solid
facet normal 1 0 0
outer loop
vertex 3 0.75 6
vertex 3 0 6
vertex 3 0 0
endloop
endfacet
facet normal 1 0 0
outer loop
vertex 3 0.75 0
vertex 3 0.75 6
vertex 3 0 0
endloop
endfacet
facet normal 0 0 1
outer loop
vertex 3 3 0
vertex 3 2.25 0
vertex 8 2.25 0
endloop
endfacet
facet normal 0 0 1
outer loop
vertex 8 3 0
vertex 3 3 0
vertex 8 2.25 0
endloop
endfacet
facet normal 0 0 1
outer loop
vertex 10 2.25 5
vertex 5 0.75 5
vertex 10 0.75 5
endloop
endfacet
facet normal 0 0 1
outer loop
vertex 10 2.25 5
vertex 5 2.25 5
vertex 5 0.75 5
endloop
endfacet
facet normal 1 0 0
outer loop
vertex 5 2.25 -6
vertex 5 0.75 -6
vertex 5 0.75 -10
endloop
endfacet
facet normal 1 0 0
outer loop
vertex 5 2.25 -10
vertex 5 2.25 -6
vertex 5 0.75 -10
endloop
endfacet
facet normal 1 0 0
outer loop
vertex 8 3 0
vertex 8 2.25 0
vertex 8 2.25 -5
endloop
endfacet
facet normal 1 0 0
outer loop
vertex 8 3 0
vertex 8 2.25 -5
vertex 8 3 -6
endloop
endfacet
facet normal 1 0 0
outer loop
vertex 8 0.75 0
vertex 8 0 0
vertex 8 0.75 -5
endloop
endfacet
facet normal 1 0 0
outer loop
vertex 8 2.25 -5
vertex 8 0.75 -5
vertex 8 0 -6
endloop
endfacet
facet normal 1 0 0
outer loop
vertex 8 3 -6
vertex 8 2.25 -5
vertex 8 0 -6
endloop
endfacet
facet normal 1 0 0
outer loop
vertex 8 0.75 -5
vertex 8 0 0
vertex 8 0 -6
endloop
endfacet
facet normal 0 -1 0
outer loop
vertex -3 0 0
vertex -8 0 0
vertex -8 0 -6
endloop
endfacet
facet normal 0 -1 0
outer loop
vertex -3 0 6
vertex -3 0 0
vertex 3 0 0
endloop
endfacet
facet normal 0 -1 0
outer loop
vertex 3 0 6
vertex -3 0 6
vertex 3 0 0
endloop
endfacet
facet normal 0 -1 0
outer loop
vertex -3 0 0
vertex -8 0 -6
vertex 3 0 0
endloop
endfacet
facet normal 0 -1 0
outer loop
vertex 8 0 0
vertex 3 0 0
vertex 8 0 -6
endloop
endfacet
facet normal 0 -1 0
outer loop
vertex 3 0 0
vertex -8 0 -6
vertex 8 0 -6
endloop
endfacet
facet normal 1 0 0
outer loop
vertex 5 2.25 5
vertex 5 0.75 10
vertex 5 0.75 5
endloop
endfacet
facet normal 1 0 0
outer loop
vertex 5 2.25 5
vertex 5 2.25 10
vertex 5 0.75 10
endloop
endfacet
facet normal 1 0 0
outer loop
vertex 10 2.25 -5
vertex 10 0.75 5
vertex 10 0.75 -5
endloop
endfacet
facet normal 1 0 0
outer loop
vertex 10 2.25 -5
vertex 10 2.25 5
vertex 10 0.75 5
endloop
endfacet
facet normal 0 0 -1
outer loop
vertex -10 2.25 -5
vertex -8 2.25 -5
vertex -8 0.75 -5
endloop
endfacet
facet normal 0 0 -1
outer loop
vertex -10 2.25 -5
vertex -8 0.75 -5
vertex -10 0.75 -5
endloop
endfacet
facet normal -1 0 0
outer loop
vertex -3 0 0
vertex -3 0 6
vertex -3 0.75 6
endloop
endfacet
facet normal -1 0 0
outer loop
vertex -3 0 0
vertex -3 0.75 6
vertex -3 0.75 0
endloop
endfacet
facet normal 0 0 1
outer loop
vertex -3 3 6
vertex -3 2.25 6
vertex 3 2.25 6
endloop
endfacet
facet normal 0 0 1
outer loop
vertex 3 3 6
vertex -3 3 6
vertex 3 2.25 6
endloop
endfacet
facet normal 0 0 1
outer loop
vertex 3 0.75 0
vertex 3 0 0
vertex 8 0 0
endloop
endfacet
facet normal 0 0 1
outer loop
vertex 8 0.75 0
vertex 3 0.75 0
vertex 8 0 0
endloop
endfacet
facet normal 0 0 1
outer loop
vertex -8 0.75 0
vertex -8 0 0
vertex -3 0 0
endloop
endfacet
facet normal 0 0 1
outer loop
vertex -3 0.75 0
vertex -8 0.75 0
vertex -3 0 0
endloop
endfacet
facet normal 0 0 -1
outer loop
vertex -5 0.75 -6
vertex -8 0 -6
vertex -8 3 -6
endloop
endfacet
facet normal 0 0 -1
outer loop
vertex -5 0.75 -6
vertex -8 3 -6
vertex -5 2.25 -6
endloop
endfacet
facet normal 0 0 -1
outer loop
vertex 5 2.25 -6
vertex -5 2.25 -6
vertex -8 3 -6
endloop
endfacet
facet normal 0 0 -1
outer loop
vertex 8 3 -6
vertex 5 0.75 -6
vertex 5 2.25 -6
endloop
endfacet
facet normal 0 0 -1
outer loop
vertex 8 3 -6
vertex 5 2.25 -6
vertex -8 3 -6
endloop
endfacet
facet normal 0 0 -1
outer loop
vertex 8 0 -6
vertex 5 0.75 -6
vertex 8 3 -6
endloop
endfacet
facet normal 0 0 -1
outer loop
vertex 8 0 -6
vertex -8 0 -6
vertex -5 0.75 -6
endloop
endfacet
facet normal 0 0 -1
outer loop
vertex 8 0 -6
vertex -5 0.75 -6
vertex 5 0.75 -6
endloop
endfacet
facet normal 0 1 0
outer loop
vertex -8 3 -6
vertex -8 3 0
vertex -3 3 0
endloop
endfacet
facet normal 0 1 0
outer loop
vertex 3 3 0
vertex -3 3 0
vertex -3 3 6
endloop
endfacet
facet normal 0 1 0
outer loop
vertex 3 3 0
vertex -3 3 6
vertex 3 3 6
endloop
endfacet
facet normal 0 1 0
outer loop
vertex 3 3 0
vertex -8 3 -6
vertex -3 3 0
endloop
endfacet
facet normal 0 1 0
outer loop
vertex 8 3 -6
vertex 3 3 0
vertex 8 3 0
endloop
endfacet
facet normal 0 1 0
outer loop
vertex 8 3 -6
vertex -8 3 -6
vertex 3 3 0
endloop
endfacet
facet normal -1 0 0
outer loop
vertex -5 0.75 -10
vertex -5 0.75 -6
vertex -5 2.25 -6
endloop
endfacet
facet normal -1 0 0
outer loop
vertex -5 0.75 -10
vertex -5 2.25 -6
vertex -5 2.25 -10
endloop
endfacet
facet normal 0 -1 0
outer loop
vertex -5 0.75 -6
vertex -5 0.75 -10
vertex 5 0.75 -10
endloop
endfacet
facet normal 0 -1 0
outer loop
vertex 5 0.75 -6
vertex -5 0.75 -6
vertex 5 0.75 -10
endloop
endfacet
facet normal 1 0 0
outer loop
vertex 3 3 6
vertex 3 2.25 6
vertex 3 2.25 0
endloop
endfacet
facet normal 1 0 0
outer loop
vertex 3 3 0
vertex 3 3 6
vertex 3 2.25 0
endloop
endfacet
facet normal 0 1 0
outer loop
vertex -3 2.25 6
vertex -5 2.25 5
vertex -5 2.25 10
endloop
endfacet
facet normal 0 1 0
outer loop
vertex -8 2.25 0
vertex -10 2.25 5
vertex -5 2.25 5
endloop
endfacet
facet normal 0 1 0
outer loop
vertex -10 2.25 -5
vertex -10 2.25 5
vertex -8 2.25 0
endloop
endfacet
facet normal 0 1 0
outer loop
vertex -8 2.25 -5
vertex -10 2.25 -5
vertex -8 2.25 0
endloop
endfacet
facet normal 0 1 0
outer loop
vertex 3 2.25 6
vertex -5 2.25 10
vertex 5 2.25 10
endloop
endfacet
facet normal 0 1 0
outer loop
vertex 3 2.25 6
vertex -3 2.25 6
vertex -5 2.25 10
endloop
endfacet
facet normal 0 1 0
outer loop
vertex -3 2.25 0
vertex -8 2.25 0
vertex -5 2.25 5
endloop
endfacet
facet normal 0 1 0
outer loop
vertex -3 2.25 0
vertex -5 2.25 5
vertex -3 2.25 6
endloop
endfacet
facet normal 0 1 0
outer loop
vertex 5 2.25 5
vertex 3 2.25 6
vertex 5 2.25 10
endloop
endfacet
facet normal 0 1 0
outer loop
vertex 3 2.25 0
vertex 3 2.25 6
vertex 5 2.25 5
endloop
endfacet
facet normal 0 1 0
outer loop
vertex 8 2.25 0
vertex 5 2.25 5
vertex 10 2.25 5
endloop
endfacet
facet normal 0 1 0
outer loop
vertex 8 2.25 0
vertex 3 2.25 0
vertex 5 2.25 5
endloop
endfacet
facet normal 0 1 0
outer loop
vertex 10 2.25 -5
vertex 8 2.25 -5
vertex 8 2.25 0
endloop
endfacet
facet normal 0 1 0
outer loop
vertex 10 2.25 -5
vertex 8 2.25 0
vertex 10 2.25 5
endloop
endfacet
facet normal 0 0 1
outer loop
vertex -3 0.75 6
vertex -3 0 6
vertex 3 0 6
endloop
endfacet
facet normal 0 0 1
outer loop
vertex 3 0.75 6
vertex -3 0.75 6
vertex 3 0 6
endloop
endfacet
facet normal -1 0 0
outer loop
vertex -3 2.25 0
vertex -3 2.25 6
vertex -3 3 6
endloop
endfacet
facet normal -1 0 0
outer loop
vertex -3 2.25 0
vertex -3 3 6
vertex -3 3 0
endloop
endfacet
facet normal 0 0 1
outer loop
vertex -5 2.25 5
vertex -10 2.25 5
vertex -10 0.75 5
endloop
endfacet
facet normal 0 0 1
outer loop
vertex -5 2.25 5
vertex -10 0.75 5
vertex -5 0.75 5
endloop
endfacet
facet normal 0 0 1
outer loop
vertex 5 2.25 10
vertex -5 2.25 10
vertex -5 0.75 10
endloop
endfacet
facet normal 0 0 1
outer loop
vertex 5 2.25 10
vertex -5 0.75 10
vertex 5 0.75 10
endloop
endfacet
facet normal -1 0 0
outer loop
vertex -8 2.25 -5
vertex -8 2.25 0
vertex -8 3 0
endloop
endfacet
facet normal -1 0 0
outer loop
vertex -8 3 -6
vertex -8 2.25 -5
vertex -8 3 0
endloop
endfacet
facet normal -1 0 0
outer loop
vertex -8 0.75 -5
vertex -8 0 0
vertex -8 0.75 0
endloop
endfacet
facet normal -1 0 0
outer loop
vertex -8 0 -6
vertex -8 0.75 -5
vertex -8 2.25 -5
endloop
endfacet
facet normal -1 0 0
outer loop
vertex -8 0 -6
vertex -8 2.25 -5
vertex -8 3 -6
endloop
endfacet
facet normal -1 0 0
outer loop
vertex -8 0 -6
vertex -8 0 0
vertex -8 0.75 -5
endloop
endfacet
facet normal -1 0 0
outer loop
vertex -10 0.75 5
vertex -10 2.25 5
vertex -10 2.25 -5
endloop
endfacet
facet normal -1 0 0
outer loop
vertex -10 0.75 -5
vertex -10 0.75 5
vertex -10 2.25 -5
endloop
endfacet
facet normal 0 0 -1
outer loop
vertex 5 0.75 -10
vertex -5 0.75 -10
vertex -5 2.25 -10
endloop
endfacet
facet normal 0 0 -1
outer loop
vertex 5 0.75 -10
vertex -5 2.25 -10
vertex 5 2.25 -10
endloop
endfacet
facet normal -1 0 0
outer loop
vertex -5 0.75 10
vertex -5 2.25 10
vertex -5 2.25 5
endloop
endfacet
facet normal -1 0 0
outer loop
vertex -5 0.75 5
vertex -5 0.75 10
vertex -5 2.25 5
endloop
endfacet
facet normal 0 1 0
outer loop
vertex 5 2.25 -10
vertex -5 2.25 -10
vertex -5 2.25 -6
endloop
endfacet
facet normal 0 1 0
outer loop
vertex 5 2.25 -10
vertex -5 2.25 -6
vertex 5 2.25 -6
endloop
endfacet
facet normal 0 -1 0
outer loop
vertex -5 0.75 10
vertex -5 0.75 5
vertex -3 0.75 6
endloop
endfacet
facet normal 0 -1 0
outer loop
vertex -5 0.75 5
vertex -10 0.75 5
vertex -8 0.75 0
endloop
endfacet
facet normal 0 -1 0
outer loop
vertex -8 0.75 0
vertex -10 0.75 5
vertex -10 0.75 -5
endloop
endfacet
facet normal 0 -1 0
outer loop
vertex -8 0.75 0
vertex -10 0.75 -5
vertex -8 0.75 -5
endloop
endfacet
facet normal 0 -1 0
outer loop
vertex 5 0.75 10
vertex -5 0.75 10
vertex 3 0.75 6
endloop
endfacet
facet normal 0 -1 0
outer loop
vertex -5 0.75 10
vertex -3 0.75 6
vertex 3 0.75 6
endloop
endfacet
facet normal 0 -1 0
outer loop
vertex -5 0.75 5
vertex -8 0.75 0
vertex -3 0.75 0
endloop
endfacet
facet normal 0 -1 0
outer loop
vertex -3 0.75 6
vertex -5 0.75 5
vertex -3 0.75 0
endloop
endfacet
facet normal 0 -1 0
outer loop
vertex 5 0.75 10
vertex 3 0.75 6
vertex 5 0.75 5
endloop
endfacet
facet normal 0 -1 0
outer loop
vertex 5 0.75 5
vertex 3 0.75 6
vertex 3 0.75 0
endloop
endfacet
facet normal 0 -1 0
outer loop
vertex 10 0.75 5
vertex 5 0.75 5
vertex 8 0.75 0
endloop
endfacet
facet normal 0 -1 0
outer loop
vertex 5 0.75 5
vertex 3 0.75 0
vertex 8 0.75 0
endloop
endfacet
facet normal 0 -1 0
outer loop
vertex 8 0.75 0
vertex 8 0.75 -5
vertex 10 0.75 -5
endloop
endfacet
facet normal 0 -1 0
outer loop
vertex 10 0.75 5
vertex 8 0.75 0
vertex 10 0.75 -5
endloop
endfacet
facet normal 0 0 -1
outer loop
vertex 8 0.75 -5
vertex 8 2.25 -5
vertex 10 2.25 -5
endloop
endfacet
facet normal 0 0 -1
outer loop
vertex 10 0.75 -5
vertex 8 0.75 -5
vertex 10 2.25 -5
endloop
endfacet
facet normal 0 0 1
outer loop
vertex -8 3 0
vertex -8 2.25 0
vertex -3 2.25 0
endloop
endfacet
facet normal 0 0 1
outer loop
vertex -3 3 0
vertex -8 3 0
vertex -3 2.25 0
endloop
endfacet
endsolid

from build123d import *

# Parameters (mm, degrees)
SKETCH1_W                = 6
SKETCH1_H                = 6
SKETCH1_W_2              = 16
BOSS_EXTRUDE2_DEPTH      = 3
SKETCH4_W                = 5
SKETCH4_H                = 10
SKETCH4_W_2              = 10
SKETCH4_H_2              = 5
BOSS_EXTRUDE3_DEPTH      = 0.75
BOSS_EXTRUDE3_DEPTH_BACK = 0.75


with BuildPart() as part:
    # Sketch1 → Boss-Extrude2 (new body)
    with BuildSketch(Plane(origin=(0, 0, 0), x_dir=(1, 0, 0), z_dir=(0, 1, 0))):
        with Locations((0, -3)):
            Rectangle(SKETCH1_W, SKETCH1_H)
        with Locations((0, 3)):
            Rectangle(SKETCH1_W_2, SKETCH1_H)
    extrude(amount=BOSS_EXTRUDE2_DEPTH)

    # Sketch4 → Boss-Extrude3 (add, two sides)
    with BuildSketch(Plane(origin=(0, 1.5, 0), x_dir=(1, 0, 0), z_dir=(0, 1, 0))) as boss_extrude3_sk:
        with Locations((-7.5, 0)):
            Rectangle(SKETCH4_W, SKETCH4_H)
        Rectangle(SKETCH4_W_2, SKETCH4_H)
        with Locations((0, 7.5)):
            Rectangle(SKETCH4_W_2, SKETCH4_H_2)
        with Locations((7.5, 0)):
            Rectangle(SKETCH4_W, SKETCH4_H)
        with Locations((0, -7.5)):
            Rectangle(SKETCH4_W_2, SKETCH4_H_2)
    extrude(amount=BOSS_EXTRUDE3_DEPTH)
    extrude(boss_extrude3_sk.sketch, amount=-BOSS_EXTRUDE3_DEPTH_BACK)


solid = part.part
